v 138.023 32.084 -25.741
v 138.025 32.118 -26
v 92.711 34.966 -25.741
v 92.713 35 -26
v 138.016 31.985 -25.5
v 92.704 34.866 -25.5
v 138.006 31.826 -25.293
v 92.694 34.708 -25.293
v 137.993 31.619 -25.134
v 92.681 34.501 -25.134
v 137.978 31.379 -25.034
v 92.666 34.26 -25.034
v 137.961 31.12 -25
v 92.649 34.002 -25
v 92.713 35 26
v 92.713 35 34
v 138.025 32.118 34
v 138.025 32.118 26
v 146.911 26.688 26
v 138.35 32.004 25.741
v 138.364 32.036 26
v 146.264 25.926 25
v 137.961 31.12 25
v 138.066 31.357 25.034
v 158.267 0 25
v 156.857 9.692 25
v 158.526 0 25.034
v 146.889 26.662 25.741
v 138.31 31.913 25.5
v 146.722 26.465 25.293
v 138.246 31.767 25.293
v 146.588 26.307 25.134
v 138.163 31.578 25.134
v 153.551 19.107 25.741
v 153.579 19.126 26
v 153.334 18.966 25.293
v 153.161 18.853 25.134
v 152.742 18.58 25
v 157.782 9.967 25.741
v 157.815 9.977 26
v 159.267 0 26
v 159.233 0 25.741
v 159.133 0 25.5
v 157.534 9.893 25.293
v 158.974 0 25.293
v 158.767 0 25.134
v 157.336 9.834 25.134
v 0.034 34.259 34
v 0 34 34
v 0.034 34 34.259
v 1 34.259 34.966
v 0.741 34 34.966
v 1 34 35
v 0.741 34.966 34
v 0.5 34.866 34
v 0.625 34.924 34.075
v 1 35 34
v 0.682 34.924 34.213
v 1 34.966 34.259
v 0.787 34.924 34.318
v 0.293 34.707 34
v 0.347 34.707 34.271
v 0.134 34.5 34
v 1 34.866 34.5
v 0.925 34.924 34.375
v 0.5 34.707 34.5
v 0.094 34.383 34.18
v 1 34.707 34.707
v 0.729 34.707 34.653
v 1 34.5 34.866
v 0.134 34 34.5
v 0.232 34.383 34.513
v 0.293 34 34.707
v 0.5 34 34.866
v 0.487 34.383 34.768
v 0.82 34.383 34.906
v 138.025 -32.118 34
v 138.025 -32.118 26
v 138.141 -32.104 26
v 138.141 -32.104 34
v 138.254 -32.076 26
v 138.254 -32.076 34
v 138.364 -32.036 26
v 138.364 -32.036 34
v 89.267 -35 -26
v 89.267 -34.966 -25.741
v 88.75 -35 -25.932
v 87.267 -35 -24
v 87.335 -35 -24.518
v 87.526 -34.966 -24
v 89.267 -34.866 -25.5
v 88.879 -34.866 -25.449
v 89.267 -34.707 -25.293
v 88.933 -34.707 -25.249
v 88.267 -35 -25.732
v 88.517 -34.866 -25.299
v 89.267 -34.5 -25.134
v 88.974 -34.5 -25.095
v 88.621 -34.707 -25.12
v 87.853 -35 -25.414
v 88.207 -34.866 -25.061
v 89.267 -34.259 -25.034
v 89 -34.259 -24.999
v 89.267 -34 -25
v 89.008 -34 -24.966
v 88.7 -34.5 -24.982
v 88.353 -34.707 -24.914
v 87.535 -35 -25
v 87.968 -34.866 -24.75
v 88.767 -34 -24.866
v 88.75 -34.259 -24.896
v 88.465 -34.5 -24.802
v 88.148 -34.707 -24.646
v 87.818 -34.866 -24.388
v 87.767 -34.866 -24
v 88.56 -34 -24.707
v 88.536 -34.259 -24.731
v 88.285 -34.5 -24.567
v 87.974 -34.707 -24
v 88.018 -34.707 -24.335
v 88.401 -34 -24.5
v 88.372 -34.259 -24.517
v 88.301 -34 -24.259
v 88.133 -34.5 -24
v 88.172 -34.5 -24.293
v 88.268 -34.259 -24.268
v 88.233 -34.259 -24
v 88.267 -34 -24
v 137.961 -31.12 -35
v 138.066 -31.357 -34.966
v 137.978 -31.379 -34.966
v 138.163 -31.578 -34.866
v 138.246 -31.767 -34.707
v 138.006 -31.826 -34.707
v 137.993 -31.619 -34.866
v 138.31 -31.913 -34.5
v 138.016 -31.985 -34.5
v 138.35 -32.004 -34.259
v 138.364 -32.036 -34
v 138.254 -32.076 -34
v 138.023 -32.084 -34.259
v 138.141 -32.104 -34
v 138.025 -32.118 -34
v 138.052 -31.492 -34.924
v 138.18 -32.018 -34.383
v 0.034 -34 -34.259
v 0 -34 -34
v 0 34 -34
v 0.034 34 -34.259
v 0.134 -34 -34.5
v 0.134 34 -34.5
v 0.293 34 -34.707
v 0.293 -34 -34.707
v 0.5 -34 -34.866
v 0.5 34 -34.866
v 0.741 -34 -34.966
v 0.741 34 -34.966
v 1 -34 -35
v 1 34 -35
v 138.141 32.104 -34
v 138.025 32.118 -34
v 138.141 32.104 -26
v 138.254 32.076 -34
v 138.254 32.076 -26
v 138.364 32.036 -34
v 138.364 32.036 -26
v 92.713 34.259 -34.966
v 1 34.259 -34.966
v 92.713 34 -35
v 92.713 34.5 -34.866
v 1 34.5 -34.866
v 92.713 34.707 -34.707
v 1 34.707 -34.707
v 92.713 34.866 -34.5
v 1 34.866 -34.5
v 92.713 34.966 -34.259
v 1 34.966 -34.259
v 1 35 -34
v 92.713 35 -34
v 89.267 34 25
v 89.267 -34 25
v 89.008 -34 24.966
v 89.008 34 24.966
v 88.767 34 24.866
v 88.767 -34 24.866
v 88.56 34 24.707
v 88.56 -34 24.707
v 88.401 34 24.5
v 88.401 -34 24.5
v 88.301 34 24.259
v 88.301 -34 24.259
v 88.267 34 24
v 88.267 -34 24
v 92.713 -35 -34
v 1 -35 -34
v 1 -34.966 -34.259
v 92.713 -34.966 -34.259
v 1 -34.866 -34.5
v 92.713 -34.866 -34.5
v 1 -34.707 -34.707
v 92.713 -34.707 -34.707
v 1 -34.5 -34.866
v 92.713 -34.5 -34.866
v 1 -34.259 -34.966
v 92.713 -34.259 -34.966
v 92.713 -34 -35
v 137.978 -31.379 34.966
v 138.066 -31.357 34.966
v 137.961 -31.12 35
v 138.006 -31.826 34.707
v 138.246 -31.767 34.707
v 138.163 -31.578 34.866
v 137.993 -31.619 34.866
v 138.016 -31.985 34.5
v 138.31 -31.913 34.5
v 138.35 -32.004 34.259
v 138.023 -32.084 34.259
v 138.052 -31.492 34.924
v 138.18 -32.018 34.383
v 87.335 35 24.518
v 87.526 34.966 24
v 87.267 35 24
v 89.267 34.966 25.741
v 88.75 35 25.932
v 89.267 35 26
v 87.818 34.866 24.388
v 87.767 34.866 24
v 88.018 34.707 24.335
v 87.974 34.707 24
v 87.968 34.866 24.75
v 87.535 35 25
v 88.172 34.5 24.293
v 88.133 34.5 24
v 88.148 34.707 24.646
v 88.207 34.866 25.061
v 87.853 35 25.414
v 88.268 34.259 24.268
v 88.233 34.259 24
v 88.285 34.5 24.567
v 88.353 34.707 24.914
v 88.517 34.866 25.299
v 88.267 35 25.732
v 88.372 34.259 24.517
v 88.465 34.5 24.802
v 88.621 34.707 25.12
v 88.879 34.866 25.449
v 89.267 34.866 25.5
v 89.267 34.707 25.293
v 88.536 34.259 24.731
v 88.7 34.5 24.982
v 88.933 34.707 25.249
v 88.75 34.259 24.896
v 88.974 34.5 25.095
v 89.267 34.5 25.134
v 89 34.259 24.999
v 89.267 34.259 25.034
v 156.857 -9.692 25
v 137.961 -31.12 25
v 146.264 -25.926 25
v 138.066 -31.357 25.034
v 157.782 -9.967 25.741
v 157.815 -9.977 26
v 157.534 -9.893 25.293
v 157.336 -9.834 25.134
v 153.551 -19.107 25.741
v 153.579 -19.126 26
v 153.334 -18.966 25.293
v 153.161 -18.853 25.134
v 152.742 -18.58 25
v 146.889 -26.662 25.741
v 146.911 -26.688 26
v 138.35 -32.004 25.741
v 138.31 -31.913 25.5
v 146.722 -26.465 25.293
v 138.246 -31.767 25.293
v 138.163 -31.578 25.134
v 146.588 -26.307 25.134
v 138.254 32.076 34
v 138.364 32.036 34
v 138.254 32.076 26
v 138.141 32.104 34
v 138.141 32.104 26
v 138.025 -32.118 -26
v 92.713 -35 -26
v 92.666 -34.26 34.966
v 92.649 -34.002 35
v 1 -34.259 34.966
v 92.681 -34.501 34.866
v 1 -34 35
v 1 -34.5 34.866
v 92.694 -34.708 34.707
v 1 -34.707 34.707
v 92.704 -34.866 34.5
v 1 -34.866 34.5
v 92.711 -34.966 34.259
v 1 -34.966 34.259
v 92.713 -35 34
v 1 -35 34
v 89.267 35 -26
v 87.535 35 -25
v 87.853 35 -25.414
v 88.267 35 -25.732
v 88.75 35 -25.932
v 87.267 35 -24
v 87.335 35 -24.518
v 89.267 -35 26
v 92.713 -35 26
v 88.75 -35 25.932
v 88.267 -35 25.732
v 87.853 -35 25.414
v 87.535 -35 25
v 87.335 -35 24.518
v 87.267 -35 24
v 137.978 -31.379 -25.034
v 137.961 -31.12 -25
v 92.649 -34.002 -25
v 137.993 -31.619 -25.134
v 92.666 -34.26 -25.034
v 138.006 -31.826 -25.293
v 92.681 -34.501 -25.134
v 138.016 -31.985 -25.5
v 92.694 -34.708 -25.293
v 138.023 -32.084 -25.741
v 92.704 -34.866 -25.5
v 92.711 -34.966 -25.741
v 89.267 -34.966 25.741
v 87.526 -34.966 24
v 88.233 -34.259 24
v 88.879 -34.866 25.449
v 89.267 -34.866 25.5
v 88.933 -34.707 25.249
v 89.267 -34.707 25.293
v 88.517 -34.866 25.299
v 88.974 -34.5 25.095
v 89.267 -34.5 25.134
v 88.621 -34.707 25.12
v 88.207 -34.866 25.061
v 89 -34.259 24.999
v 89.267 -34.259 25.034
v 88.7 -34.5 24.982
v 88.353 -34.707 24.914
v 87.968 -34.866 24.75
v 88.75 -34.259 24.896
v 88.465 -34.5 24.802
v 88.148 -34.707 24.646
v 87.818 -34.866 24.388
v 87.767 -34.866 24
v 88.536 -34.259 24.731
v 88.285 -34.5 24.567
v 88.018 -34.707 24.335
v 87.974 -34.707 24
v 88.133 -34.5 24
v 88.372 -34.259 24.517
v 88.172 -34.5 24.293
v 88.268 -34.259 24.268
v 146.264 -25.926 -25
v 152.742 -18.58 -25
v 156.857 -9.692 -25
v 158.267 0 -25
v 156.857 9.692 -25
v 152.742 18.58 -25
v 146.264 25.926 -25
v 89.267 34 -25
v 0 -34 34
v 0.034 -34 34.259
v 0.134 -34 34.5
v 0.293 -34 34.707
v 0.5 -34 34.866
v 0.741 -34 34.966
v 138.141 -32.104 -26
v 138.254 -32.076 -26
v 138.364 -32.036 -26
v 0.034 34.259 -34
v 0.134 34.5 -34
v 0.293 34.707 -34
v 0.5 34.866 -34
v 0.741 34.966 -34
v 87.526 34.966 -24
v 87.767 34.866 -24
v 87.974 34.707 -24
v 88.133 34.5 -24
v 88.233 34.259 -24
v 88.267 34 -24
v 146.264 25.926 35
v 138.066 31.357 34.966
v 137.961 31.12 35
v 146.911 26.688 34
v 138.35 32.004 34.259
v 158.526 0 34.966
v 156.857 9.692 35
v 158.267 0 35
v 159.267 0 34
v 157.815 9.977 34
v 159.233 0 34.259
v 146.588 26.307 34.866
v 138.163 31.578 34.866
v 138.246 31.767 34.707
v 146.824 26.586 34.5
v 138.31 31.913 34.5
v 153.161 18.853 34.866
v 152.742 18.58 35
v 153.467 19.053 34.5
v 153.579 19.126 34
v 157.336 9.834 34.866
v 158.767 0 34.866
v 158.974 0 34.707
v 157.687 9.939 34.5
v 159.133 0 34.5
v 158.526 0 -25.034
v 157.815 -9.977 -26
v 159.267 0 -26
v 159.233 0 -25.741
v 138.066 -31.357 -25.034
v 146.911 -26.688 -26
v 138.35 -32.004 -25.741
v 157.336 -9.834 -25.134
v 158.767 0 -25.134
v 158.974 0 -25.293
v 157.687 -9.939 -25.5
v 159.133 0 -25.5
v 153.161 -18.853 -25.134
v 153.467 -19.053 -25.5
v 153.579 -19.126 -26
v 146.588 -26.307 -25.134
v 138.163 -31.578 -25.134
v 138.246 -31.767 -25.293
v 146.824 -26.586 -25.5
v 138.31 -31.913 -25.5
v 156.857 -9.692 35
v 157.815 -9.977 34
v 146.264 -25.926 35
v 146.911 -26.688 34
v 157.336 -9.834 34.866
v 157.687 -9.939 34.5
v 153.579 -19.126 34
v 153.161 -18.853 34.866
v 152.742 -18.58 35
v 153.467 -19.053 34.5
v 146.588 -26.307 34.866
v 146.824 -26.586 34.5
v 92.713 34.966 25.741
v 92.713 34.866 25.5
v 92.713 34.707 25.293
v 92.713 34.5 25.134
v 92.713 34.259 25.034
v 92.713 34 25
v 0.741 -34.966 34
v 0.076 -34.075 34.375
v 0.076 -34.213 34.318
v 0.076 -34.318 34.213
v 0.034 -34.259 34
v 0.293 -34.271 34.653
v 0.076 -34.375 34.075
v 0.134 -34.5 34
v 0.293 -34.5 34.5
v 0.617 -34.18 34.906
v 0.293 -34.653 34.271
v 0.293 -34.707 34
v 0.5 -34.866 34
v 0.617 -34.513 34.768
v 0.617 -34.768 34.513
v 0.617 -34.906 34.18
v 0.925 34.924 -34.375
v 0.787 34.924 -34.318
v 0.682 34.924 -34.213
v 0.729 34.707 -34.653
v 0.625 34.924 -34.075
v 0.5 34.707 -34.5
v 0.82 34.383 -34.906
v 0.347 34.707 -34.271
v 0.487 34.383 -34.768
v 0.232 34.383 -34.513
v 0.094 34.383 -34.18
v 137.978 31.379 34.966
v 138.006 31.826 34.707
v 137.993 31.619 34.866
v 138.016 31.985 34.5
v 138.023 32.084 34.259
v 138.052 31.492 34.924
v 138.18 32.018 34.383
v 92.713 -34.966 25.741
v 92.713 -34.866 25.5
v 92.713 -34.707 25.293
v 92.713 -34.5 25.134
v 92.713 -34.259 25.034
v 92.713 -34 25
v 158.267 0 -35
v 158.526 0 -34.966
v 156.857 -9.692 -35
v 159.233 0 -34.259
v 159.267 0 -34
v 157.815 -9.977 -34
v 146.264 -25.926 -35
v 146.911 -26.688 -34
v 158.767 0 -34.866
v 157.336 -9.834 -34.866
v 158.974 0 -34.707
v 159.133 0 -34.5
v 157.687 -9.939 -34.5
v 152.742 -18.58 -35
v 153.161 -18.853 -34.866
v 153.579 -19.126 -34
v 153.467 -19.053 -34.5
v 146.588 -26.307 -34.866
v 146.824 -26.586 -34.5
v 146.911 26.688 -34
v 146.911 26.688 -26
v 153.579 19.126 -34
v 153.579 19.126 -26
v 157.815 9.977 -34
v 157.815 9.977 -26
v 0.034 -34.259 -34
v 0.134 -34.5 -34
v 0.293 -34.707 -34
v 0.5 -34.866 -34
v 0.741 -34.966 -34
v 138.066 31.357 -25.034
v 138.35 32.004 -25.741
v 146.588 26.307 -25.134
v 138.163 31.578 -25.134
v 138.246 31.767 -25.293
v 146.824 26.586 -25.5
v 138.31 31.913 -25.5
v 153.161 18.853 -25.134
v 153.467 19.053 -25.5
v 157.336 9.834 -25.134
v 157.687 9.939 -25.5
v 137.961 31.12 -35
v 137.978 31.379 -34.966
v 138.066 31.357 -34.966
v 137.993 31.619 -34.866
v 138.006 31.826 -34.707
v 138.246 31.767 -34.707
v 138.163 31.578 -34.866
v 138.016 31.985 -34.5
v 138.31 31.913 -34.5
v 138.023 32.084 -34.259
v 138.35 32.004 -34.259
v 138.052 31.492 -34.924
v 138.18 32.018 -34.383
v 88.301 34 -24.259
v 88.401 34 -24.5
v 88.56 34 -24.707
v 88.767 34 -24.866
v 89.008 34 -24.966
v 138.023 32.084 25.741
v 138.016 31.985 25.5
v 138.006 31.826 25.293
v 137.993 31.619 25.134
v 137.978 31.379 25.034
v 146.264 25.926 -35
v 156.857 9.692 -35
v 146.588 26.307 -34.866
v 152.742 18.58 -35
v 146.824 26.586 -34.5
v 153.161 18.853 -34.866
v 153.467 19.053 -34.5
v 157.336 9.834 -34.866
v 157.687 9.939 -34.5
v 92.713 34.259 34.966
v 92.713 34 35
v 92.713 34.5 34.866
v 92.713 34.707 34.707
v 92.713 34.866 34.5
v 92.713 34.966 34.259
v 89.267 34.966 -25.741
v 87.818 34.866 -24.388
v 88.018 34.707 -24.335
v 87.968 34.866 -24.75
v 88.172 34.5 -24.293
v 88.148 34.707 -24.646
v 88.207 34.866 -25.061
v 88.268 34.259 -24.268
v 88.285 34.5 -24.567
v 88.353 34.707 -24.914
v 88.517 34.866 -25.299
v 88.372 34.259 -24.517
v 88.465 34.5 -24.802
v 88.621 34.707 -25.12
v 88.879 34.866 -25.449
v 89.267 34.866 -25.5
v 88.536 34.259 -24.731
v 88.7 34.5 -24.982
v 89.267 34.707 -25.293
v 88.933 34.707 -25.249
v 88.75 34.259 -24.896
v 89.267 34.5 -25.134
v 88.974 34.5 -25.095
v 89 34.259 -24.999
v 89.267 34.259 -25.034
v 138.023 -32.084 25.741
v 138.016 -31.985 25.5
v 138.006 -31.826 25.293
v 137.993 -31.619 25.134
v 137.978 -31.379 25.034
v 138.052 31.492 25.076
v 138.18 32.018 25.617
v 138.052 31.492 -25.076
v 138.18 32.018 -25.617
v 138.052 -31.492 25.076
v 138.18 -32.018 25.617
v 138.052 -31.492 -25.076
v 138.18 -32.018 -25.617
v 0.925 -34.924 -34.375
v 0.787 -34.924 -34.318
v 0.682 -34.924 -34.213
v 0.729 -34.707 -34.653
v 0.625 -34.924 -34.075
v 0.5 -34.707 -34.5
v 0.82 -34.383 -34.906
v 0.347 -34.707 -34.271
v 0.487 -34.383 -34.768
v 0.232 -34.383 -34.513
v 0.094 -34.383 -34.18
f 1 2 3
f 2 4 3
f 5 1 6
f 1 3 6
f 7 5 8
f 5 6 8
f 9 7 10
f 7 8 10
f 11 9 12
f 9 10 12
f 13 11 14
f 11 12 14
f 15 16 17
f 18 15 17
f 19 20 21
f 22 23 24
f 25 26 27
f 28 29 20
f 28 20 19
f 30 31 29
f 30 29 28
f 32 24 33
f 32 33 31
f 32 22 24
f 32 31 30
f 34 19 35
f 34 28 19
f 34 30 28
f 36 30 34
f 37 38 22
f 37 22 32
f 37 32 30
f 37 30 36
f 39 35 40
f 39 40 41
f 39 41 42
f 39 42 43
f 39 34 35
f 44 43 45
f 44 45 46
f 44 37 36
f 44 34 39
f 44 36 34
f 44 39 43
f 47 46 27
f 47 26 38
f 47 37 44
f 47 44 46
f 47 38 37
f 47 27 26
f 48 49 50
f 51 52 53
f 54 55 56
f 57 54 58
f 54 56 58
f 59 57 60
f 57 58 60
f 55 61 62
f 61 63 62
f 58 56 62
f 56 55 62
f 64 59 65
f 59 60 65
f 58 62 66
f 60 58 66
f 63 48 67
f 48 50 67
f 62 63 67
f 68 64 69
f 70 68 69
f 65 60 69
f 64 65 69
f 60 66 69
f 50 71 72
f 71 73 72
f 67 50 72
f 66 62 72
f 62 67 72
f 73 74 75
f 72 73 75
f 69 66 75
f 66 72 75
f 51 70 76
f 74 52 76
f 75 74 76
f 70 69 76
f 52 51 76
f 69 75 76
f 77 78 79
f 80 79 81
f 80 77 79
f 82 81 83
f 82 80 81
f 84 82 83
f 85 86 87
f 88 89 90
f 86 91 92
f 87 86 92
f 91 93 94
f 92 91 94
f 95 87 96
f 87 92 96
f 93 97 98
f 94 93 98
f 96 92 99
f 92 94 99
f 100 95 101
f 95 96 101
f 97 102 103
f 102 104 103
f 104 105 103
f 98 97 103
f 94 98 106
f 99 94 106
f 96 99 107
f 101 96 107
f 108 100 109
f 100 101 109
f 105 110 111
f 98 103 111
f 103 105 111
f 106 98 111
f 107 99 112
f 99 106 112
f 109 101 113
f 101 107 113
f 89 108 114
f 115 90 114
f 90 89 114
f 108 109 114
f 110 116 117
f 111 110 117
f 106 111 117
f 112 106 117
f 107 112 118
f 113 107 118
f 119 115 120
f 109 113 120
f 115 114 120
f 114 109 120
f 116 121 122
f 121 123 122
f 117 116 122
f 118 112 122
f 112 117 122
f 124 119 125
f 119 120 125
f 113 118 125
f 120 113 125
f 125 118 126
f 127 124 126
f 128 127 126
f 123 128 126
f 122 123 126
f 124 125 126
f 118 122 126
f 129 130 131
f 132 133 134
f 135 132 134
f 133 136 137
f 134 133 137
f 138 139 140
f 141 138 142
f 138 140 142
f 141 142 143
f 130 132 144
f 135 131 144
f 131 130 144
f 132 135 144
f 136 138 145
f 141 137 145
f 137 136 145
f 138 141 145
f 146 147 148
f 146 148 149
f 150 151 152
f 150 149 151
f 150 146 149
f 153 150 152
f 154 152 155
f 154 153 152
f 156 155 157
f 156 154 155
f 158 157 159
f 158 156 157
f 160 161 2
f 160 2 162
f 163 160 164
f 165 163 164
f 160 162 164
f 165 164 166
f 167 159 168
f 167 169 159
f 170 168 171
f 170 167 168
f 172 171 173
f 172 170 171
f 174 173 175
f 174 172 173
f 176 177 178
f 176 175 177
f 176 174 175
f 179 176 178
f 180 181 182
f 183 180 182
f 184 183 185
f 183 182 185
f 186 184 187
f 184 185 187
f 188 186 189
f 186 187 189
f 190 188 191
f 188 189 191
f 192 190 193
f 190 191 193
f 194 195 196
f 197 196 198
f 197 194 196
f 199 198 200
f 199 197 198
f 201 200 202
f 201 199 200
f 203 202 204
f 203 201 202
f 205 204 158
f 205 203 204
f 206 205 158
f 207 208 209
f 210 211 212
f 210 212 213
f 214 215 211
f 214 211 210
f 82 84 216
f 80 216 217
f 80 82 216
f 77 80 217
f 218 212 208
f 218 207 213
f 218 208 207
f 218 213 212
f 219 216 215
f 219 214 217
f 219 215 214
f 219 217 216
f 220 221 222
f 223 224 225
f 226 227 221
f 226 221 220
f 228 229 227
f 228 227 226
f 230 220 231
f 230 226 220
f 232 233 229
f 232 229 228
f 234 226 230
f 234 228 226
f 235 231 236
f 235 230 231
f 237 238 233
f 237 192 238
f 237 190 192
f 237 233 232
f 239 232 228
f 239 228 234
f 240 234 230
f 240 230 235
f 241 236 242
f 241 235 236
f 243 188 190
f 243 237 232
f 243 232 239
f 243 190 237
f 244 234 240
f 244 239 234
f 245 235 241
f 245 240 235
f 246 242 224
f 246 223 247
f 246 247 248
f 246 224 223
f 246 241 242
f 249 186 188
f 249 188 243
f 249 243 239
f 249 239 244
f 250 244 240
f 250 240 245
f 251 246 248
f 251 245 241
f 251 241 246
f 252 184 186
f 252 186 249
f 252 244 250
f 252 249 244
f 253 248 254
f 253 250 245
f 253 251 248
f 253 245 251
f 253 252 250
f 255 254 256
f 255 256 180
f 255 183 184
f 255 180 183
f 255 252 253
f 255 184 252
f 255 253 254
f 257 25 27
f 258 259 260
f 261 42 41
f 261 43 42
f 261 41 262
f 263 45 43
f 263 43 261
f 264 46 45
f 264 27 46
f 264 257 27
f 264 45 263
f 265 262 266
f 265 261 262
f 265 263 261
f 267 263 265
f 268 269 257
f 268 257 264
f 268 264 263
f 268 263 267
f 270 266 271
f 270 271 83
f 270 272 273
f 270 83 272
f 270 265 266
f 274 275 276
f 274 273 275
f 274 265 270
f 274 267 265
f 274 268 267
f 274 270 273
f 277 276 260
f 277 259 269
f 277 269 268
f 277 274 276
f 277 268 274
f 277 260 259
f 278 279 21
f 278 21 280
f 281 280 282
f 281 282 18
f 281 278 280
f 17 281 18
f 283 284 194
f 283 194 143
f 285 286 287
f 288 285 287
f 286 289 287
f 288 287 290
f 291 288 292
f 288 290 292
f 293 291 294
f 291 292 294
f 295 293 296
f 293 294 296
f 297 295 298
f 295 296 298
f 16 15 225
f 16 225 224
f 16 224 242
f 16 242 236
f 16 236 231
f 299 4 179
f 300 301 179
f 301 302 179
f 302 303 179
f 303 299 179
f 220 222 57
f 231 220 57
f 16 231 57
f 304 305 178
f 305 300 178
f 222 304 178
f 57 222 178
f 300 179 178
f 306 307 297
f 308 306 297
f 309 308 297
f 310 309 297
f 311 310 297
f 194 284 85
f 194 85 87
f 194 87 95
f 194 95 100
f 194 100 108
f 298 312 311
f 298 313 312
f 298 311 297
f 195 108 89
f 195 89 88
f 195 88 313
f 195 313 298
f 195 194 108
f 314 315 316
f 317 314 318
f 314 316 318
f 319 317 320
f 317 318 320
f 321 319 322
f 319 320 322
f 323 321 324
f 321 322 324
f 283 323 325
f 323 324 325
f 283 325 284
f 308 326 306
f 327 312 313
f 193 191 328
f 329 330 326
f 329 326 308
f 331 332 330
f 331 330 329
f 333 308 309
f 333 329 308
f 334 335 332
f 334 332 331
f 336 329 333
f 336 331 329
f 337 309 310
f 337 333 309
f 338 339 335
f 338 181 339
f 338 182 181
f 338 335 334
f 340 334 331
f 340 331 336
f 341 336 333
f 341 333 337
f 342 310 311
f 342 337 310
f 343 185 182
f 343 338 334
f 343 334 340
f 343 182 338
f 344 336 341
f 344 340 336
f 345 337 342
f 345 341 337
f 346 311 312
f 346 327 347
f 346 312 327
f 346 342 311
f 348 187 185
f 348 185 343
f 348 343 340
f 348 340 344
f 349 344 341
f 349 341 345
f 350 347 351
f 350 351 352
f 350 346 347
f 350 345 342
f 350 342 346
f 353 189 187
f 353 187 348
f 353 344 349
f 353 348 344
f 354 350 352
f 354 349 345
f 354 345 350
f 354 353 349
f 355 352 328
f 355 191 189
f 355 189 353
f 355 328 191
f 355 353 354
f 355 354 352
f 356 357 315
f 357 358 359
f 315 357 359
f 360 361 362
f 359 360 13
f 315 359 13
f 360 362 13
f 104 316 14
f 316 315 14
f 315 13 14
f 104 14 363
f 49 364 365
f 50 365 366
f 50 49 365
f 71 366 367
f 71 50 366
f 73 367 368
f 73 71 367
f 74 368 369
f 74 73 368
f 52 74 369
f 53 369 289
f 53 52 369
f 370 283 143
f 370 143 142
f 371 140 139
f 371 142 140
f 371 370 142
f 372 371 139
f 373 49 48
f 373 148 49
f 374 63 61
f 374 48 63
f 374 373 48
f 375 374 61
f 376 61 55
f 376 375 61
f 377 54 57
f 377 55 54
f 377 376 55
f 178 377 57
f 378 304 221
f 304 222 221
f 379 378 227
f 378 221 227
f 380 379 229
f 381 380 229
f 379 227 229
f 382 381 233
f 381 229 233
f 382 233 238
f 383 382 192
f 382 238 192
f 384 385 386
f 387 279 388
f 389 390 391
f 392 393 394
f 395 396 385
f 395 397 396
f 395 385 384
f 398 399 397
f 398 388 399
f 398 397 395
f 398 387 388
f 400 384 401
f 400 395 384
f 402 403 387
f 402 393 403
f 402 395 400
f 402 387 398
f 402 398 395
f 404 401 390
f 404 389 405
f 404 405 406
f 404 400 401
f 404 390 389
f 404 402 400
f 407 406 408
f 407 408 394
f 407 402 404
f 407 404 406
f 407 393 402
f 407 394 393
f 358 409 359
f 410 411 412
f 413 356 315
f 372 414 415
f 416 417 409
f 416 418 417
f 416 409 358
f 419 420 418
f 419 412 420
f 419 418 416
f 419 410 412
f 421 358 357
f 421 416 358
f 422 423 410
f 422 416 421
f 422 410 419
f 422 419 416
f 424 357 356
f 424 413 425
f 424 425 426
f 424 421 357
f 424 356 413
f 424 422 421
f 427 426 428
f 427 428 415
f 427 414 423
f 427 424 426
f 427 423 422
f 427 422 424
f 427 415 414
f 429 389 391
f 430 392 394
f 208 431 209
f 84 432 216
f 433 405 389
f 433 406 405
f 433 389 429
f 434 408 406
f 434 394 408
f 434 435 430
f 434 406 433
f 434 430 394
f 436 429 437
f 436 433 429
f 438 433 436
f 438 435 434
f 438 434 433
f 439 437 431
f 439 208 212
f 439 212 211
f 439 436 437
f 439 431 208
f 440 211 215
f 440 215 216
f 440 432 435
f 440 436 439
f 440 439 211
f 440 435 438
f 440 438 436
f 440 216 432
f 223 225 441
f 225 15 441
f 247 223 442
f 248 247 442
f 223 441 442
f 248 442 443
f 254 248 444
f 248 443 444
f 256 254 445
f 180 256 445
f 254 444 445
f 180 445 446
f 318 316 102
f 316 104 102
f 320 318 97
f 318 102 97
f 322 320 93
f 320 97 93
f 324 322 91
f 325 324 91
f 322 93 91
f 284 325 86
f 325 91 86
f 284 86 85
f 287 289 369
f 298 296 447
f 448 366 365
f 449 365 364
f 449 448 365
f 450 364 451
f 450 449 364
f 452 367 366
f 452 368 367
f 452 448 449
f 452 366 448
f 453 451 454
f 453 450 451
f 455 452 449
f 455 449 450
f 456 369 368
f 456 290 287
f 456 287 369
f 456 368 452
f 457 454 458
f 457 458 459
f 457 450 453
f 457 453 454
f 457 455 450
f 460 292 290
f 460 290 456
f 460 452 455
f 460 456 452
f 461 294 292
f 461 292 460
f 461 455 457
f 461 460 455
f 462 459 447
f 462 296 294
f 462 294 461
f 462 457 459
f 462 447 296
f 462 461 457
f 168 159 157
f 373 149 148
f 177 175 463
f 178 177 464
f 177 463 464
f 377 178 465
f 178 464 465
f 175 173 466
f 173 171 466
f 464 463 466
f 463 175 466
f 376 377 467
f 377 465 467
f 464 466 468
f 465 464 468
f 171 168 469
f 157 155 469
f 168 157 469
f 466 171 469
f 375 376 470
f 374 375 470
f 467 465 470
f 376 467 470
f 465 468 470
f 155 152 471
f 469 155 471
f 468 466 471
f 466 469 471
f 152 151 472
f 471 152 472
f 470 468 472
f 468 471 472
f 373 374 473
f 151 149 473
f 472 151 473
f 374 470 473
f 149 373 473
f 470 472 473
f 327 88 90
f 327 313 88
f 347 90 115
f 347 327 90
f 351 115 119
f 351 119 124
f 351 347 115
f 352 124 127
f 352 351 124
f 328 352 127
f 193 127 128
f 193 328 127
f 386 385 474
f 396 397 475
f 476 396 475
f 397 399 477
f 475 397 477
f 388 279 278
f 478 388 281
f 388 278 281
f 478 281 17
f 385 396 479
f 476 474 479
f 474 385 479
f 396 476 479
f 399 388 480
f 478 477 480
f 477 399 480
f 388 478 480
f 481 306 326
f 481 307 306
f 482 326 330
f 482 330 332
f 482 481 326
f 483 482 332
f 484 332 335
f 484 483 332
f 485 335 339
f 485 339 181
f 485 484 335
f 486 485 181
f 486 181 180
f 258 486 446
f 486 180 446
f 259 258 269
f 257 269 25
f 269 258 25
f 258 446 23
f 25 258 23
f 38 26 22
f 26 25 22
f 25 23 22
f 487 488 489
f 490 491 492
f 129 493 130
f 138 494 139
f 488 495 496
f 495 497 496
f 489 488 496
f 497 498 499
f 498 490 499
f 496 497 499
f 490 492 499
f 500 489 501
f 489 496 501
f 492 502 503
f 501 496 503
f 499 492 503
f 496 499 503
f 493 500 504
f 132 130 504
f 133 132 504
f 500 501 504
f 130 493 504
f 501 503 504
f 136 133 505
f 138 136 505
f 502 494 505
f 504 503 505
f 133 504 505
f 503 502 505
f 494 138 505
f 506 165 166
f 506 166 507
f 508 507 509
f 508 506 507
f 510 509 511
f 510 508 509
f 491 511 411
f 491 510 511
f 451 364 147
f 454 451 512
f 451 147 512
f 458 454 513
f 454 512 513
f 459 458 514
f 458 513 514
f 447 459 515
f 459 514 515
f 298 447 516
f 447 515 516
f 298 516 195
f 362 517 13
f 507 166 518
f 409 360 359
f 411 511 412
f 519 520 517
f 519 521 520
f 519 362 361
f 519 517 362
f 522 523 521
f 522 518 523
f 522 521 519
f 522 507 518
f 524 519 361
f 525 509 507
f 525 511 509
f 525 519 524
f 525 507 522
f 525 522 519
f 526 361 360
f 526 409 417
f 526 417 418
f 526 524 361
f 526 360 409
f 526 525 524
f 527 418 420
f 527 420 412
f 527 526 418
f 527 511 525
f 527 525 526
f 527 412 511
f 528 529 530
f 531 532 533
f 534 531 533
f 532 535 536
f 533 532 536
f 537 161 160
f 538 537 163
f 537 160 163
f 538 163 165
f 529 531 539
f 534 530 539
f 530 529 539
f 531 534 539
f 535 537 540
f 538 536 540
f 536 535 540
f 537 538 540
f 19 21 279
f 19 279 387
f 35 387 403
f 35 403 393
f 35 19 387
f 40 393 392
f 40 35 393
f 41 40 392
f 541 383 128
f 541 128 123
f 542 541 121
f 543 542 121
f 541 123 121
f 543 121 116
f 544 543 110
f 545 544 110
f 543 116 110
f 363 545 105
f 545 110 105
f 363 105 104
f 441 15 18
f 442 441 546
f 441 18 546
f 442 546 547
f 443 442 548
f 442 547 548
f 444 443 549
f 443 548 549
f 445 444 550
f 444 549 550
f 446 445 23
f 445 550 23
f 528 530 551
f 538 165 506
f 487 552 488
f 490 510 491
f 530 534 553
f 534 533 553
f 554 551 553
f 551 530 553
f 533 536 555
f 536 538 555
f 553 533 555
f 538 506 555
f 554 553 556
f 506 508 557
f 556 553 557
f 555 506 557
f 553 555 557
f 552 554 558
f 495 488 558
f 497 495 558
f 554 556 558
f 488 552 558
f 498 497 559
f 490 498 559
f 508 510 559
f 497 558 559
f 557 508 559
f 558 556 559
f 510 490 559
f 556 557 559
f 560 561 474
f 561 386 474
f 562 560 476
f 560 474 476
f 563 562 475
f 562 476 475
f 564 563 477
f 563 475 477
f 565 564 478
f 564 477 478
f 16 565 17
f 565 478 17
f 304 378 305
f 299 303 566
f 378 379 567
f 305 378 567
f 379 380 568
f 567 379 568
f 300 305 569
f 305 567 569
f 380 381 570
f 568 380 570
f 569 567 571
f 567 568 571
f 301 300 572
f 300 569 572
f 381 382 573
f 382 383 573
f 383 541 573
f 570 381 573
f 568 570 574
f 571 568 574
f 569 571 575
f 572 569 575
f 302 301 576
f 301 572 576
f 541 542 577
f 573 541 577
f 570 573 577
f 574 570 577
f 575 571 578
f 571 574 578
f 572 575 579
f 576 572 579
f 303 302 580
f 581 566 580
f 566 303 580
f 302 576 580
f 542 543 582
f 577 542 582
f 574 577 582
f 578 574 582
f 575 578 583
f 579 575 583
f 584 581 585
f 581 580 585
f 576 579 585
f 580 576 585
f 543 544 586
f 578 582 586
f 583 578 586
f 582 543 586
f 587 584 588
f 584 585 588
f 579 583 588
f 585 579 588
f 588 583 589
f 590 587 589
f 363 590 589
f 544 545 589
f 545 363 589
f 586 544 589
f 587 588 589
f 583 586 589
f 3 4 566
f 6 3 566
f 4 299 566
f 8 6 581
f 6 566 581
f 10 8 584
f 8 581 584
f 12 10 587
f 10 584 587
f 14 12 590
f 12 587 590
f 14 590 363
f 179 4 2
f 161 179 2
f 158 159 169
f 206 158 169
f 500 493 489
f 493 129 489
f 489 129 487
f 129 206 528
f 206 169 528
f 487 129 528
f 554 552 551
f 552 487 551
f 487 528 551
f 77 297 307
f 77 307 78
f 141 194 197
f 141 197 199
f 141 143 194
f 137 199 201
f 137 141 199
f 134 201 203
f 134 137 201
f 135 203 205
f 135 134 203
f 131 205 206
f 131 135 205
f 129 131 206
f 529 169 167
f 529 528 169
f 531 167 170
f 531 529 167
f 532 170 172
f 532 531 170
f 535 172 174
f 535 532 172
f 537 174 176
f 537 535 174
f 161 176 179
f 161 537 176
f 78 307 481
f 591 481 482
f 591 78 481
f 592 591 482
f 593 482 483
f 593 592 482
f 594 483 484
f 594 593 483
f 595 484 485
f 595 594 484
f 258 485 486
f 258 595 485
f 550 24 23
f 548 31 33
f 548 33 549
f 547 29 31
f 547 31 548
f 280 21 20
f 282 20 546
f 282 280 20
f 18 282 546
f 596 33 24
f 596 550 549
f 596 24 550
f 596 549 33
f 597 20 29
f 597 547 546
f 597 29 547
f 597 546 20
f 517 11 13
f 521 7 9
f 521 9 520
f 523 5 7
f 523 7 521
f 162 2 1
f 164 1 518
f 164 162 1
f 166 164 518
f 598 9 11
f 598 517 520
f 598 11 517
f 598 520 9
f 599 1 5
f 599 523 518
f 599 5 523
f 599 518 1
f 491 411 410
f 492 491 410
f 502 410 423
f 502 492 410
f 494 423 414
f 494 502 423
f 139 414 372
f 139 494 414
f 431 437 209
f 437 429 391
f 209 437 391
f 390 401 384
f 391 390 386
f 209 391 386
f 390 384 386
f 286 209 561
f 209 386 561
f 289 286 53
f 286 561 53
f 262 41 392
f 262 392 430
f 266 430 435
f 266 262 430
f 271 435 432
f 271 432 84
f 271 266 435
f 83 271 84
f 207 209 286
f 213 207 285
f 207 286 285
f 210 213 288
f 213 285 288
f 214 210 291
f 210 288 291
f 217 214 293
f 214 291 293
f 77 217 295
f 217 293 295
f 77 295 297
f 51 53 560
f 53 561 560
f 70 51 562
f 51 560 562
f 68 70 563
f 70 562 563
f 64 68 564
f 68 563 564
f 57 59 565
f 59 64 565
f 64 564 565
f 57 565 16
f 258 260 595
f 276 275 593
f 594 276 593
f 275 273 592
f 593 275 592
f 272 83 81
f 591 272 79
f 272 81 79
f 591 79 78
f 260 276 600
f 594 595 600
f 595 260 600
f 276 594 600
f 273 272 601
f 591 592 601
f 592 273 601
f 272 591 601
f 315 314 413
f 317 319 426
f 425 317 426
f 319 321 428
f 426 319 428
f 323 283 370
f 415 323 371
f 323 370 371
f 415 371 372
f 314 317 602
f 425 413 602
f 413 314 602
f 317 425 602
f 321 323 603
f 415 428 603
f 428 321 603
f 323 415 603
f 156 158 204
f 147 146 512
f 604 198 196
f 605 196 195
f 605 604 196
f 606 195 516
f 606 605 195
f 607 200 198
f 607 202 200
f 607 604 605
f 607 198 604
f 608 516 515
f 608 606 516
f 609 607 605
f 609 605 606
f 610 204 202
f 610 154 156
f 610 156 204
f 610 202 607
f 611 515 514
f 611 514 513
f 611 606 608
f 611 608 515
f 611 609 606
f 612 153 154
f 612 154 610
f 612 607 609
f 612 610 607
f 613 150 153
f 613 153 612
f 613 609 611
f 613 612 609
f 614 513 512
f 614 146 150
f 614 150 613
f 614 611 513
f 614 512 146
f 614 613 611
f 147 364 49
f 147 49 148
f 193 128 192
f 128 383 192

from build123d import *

# Parameters (mm, degrees)
BOSS_EXTRUDE1_DEPTH = 35
CUT_EXTRUDE1_DEPTH  = 70
CUT_EXTRUDE2_START  = -70
CUT_EXTRUDE2_DEPTH  = 70
FILLET3_R           = 1


# Read off the part's stored shape, not the designer's step: Cut-Extrude2
with BuildPart() as part:
    # Sketch2 → Boss-Extrude1 (new, symmetric)
    with BuildSketch(Plane(origin=(0, 0, 0), x_dir=(1, 0, 0), z_dir=(0, 1, 0))):
        Polygon((0, 0), (0, 70), (159.267236843, 70), (159.267236843, 60), (88.267236843, 60), (88.267236843, 10), (159.267236843, 10), (159.267236843, 0), align=None)
    extrude(amount=BOSS_EXTRUDE1_DEPTH, both=True)

    # Sketch3 → Cut-Extrude1 (cut)
    with BuildSketch(Plane.XY):
        Polygon((92.712686328, 35), (159.267236843, 30.767300383), (159.267236843, 35), align=None)
        Polygon((92.712686328, -35), (159.267236843, -30.767300383), (159.267236843, -35), align=None)
    extrude(amount=-CUT_EXTRUDE1_DEPTH, mode=Mode.SUBTRACT)

    # Cut-Extrude2 outline → Cut-Extrude2 (cut)
    with BuildSketch(Plane.XY.offset(CUT_EXTRUDE2_START)):
        with BuildLine():
            Line((159.267236843, 30.767300383), (138.20045286, 32.107094098))
            ThreePointArc((138.20045286, 32.107094098), (153.530375436, 19.200747894), (159.267236843, 0))
            Line((159.267236843, 0), (159.267236843, 30.767300383))
        make_face()
        with BuildLine():
            Line((159.267236843, -30.767300383), (159.267236843, 0))
            ThreePointArc((159.267236843, 0), (153.530375436, -19.200747894), (138.20045286, -32.107094098))
            Line((138.20045286, -32.107094098), (159.267236843, -30.767300383))
        make_face()
    extrude(amount=CUT_EXTRUDE2_DEPTH, mode=Mode.SUBTRACT)

    # Fillet3
    fillet3_edges = [part.edges().sort_by_distance(p)[0] for p in [
        (88.267236843, -35, -35),
        (46.356343164, -35, 0),
        (0, 0, 0),
        (0, 0, -70),
        (88.267236843, 0, -60),
        (88.267236843, 0, -10),
        (88.267236843, 35, -35),
        (90.489961586, 35, -60),
        (46.356343164, -35, -70),
        (90.489961586, -35, -10),
        (92.712686328, -35, -5),
        (90.489961586, 35, -10),
        (46.356343164, 35, -70),
        (92.712686328, 35, -5),
        (0, 35, -35),
        (92.712686328, 35, -65),
        (115.456569594, 33.553547049, -10),
        (115.456569594, 33.553547049, -70),
        (115.456569594, 33.553547049, 0),
        (92.712686328, -35, -65),
        (115.456569594, -33.553547049, -60),
        (46.356343164, 35, 0),
        (138.20045286, 32.107094098, -5),
        (115.456569594, 33.553547049, -60),
        (115.456569594, -33.553547049, 0),
        (115.456569594, -33.553547049, -10),
        (115.456569594, -33.553547049, -70),
        (153.530375436, -19.200747894, -60),
        (138.20045286, -32.107094098, -65),
        (153.530375436, 19.200747894, -70),
        (138.20045286, -32.107094098, -5),
        (153.530375436, 19.200747894, -10),
        (138.20045286, 32.107094098, -65),
        (153.530375436, 19.200747894, 0),
        (0, -35, -35),
        (90.489961586, -35, -60),
    ]]
    fillet(fillet3_edges, radius=FILLET3_R)


with BuildPart() as part_1:
    # Body-Move/Copy1: moved
    add(part.part.moved(Location((0, 0, 35))))


solid = part_1.part
